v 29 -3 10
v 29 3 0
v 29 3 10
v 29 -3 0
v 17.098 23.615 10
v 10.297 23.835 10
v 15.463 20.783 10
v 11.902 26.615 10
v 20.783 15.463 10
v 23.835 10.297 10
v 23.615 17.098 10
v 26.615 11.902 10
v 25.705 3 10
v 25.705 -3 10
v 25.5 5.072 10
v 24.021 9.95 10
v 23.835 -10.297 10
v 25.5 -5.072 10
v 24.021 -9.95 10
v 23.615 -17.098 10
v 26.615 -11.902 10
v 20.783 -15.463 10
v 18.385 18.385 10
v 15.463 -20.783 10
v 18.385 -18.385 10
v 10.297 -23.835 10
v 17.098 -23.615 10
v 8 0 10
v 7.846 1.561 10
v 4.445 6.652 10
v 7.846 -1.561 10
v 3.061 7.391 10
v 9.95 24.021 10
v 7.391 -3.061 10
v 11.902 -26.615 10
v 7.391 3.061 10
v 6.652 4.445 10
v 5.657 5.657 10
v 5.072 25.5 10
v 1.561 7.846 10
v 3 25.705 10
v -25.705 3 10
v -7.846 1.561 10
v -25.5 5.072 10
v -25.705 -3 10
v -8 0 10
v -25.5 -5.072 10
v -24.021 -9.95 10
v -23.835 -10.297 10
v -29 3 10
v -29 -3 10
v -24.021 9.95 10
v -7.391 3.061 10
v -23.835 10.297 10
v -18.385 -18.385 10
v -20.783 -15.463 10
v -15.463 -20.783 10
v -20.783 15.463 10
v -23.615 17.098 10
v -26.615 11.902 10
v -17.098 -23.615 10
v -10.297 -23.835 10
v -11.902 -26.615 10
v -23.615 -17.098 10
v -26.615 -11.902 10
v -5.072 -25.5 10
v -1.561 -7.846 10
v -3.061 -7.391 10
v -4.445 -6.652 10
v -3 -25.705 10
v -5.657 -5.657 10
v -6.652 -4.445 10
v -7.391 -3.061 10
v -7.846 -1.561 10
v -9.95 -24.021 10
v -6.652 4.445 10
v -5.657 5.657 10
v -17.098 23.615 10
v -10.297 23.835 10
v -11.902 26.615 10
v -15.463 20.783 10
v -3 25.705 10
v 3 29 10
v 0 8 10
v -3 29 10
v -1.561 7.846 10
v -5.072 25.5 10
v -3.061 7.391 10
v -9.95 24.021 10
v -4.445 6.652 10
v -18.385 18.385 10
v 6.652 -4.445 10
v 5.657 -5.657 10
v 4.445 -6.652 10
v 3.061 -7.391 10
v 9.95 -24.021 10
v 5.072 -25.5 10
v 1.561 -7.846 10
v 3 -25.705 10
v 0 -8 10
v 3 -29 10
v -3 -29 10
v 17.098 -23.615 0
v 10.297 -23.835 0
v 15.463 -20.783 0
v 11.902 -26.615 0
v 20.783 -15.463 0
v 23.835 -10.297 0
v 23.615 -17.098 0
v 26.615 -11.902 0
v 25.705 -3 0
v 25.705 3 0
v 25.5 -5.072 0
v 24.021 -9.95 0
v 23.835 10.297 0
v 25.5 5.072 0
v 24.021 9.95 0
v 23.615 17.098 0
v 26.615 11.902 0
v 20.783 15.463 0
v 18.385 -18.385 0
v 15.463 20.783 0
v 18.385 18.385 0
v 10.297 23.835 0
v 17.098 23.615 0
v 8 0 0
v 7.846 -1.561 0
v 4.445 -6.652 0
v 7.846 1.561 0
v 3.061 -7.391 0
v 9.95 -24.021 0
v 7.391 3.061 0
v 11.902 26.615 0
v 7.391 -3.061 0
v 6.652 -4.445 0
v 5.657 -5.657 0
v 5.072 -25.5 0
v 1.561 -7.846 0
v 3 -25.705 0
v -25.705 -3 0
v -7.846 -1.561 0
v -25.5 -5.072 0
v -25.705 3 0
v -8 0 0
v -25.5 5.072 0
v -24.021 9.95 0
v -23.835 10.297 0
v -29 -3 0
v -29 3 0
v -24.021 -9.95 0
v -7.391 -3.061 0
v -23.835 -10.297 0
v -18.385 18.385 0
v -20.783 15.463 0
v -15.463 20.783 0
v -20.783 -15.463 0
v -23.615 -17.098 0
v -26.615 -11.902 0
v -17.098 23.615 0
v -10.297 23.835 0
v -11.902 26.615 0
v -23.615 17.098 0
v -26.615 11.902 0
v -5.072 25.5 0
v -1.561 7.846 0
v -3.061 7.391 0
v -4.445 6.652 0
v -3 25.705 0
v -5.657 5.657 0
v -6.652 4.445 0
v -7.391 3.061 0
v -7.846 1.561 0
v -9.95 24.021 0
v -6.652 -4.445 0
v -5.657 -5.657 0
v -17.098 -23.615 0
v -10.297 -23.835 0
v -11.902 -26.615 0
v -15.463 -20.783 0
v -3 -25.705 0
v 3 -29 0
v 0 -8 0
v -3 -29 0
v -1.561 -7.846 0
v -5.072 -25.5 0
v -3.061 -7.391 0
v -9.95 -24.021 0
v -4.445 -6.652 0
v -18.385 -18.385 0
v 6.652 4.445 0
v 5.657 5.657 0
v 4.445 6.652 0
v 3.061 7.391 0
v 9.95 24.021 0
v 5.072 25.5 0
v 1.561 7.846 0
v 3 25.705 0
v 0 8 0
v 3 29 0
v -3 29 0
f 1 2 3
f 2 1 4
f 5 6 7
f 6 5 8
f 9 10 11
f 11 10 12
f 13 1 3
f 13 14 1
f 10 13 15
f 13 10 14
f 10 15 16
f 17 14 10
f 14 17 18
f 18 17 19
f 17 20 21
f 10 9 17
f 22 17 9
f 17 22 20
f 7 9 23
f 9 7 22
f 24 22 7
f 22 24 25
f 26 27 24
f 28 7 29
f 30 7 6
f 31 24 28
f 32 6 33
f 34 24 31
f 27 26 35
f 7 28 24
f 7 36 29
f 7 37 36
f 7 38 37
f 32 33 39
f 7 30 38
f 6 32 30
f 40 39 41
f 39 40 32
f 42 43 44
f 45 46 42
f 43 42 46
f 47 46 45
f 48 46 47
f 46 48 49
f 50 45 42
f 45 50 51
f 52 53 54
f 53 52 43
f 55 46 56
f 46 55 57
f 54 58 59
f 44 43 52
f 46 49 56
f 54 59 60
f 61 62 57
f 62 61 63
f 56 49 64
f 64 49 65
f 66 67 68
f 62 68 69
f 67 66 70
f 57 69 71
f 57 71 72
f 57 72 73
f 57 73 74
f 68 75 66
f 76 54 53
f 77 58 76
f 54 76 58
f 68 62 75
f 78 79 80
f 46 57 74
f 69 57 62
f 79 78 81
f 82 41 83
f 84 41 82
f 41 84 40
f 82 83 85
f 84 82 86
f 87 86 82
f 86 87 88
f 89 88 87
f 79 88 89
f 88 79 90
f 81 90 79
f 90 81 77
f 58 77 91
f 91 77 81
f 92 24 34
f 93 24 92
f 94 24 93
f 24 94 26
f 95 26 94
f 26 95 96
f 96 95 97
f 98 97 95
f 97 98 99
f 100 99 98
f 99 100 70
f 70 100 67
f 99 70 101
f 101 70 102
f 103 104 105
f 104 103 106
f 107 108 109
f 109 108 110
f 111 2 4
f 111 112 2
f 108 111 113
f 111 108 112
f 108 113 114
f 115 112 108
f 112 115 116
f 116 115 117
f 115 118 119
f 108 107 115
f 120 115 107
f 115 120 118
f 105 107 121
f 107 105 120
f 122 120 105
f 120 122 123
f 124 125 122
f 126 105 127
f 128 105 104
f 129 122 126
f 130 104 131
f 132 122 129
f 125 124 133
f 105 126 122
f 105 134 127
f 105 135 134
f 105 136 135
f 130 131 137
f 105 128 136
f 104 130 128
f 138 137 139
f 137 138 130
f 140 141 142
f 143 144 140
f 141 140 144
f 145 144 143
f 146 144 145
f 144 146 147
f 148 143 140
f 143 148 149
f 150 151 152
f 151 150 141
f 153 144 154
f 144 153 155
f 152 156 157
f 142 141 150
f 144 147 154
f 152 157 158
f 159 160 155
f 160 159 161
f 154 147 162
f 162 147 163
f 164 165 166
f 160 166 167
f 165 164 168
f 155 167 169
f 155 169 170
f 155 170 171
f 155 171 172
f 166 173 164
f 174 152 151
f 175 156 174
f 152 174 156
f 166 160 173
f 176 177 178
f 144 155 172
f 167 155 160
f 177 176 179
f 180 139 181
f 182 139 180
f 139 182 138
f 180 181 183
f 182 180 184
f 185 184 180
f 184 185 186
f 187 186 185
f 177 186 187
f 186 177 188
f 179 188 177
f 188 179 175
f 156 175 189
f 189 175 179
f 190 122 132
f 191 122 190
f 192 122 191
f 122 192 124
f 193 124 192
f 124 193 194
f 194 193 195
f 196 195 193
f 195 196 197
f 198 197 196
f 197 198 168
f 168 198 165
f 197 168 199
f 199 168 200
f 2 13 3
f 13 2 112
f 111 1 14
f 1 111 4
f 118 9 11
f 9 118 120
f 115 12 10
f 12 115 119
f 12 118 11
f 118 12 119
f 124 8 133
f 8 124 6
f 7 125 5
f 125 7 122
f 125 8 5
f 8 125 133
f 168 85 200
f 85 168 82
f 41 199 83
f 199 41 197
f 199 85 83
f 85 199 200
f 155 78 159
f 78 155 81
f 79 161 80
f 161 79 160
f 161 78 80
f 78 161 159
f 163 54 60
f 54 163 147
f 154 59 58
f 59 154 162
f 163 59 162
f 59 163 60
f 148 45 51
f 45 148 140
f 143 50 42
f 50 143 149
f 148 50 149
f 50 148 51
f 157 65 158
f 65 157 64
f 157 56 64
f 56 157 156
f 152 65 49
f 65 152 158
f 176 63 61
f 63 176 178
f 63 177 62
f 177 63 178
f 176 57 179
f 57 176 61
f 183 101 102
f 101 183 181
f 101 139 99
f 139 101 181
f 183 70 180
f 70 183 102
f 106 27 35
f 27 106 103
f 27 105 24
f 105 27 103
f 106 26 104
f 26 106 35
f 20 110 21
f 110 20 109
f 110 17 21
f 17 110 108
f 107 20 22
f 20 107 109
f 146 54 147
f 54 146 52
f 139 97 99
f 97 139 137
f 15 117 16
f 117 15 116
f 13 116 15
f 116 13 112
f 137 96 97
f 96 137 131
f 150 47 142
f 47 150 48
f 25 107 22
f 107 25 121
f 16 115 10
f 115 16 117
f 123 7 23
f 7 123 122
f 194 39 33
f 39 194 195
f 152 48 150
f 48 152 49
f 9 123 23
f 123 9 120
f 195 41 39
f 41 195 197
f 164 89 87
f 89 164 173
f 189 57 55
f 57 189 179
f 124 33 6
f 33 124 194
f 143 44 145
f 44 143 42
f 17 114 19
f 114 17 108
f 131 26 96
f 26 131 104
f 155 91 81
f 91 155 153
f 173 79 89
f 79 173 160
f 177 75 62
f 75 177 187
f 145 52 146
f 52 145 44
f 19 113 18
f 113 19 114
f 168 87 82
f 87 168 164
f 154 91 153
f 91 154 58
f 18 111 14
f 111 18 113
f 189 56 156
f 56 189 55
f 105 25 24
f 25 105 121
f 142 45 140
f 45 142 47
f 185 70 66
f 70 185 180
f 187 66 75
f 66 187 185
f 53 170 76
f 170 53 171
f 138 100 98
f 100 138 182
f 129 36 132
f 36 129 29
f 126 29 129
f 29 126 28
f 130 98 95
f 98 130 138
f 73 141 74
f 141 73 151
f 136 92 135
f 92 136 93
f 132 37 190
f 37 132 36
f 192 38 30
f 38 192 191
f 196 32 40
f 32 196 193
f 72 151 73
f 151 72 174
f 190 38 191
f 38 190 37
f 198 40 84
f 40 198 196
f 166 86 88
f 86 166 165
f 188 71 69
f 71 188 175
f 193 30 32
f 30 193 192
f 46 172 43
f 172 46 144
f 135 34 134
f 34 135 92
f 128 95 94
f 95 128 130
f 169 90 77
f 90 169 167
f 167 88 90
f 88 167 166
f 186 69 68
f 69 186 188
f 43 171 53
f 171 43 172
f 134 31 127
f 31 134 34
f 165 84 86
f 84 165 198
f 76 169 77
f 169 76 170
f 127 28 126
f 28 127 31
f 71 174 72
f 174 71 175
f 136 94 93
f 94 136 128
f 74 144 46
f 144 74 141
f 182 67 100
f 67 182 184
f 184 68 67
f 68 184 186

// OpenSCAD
$fn = 32;

// ----------------------------------------------------------------------
// Spur blank: bored gear blank
// ----------------------------------------------------------------------

// --- parameters (mm) ---
disc_r = 26;              // blank root radius
disc_t = 10;              // blank thickness
n_teeth = 12;             // stub tooth count
tooth_w = 6;              // tooth width at the root
tooth_h = 3;              // tooth height above the root
bore_r = 8;               // central bore radius

out_r = disc_r + tooth_h;  // tip radius
bbox_x = 58.0;  // measured width over the teeth
bbox_y = 58.0;  // measured depth over the teeth

difference() {
union() {
  cylinder(r = disc_r, h = disc_t);
  for (i = [0 : n_teeth - 1])
    rotate([0, 0, i * 360 / n_teeth])
      translate([disc_r - 1, -tooth_w / 2, 0])
        cube([tooth_h + 1, tooth_w, disc_t]);
}
  translate([0, 0, -1]) cylinder(r = bore_r, h = disc_t + 2);
}
